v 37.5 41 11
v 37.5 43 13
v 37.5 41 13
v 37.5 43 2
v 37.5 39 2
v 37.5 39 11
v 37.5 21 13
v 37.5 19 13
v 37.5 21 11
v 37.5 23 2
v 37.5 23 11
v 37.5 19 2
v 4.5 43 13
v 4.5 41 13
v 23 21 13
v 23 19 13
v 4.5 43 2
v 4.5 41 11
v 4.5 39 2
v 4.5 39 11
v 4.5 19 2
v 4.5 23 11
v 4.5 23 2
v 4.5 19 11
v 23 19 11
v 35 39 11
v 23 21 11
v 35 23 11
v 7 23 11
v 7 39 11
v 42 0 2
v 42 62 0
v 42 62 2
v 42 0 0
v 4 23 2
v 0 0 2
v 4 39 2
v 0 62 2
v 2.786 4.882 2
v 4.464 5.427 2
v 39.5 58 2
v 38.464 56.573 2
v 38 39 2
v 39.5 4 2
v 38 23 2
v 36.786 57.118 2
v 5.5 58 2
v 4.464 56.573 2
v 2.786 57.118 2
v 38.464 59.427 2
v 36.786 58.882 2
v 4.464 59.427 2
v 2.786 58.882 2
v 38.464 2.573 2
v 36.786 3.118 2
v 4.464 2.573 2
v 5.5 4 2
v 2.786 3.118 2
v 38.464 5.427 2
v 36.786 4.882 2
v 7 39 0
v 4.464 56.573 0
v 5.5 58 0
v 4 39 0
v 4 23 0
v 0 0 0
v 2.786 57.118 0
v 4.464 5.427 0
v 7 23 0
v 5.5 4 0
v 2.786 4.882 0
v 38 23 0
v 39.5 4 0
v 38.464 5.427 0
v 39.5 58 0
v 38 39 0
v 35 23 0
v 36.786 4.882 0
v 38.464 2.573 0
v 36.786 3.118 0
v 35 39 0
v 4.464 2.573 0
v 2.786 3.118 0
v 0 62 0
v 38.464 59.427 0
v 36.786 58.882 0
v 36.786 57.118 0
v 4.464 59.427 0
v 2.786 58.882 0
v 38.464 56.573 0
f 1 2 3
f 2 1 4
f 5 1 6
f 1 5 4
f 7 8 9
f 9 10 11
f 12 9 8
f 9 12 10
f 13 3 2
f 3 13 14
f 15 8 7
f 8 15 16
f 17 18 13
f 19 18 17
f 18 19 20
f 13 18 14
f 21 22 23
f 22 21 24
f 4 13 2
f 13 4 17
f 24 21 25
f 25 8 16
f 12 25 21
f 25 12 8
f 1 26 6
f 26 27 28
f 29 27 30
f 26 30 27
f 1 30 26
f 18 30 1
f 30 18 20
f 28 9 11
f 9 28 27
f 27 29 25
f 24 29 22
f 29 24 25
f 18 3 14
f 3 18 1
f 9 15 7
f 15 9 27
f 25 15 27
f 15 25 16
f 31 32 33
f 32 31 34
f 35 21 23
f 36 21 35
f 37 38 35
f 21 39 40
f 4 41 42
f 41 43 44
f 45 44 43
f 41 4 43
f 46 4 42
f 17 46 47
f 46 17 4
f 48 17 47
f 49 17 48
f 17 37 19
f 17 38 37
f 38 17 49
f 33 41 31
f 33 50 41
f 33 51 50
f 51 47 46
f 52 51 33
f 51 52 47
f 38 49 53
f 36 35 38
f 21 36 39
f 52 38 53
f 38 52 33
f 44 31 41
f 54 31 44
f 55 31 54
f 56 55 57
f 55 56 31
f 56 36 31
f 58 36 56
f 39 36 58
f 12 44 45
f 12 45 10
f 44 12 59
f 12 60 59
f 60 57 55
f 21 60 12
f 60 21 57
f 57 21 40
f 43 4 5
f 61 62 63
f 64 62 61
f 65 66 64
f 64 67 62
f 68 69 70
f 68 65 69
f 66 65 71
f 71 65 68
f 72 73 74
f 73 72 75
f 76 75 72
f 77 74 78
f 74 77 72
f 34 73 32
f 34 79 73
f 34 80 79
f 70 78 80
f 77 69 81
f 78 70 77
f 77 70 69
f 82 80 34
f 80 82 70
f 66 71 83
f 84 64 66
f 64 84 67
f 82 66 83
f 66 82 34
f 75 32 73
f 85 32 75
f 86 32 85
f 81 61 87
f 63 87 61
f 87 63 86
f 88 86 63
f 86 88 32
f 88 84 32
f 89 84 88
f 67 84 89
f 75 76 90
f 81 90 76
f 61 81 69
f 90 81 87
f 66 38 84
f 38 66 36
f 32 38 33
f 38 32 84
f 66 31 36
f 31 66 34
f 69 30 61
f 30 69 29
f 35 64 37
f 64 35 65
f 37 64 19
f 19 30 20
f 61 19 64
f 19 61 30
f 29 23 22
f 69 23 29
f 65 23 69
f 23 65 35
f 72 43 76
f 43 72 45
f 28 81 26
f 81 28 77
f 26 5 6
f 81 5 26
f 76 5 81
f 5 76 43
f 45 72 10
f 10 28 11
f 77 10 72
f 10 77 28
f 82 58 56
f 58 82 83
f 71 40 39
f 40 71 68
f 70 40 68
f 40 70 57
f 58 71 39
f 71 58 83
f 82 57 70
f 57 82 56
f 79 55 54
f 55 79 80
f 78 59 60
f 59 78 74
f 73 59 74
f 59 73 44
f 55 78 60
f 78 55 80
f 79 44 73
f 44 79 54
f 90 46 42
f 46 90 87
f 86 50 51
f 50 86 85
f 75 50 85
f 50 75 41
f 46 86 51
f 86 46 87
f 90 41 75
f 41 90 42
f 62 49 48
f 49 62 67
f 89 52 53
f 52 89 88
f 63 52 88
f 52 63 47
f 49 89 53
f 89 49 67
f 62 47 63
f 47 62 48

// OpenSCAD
caja_x=42;
caja_y=62;
caja_z=22;
mz_x=27;
mz_y=20;
mz_z=9;
mz_hole_x=3;
e=2;

difference(){
union(){
cube([caja_x,caja_y,e]);
 translate([(caja_x-mz_x-2*mz_hole_x)/2,(caja_y-mz_y-2*e)/2,0])
 cube([mz_x+2*mz_hole_x,mz_y+2*e,caja_z-mz_z-2*e]);
translate([0,0,caja_z-mz_z-2*e])
difference(){
translate([(caja_x-mz_x-2*mz_hole_x)/2,(caja_y-mz_y-2*e)/2,0])
 cube([mz_x+2*mz_hole_x,mz_y+2*e,e*2]);
translate([0,(caja_y-mz_y+2*e-2*e)/2,e])
    cube([caja_x,mz_y,caja_z]);
translate([e,0,e])
    cube([caja_x/2,caja_y/2,2*e]);   
}}
translate([2*e,caja_y/2-(mz_y-2*e)/2,0])  
cube([mz_hole_x,mz_y-2*e,caja_z]);
    translate([4*e+mz_x,caja_y/2-(mz_y-2*e)/2,0])  
cube([mz_hole_x,mz_y-2*e,caja_z]);
translate([2*e,2*e,0])
#cylinder(h=10,d=3,center=true);
translate([caja_x-2*e,2*e,0])
#cylinder(h=10,d=3,center=true);
translate([caja_x-2*e,caja_y-2*e,0])
#cylinder(h=10,d=3,center=true);
translate([2*e,caja_y-2*e,0])
#cylinder(h=10,d=3,center=true);


}
